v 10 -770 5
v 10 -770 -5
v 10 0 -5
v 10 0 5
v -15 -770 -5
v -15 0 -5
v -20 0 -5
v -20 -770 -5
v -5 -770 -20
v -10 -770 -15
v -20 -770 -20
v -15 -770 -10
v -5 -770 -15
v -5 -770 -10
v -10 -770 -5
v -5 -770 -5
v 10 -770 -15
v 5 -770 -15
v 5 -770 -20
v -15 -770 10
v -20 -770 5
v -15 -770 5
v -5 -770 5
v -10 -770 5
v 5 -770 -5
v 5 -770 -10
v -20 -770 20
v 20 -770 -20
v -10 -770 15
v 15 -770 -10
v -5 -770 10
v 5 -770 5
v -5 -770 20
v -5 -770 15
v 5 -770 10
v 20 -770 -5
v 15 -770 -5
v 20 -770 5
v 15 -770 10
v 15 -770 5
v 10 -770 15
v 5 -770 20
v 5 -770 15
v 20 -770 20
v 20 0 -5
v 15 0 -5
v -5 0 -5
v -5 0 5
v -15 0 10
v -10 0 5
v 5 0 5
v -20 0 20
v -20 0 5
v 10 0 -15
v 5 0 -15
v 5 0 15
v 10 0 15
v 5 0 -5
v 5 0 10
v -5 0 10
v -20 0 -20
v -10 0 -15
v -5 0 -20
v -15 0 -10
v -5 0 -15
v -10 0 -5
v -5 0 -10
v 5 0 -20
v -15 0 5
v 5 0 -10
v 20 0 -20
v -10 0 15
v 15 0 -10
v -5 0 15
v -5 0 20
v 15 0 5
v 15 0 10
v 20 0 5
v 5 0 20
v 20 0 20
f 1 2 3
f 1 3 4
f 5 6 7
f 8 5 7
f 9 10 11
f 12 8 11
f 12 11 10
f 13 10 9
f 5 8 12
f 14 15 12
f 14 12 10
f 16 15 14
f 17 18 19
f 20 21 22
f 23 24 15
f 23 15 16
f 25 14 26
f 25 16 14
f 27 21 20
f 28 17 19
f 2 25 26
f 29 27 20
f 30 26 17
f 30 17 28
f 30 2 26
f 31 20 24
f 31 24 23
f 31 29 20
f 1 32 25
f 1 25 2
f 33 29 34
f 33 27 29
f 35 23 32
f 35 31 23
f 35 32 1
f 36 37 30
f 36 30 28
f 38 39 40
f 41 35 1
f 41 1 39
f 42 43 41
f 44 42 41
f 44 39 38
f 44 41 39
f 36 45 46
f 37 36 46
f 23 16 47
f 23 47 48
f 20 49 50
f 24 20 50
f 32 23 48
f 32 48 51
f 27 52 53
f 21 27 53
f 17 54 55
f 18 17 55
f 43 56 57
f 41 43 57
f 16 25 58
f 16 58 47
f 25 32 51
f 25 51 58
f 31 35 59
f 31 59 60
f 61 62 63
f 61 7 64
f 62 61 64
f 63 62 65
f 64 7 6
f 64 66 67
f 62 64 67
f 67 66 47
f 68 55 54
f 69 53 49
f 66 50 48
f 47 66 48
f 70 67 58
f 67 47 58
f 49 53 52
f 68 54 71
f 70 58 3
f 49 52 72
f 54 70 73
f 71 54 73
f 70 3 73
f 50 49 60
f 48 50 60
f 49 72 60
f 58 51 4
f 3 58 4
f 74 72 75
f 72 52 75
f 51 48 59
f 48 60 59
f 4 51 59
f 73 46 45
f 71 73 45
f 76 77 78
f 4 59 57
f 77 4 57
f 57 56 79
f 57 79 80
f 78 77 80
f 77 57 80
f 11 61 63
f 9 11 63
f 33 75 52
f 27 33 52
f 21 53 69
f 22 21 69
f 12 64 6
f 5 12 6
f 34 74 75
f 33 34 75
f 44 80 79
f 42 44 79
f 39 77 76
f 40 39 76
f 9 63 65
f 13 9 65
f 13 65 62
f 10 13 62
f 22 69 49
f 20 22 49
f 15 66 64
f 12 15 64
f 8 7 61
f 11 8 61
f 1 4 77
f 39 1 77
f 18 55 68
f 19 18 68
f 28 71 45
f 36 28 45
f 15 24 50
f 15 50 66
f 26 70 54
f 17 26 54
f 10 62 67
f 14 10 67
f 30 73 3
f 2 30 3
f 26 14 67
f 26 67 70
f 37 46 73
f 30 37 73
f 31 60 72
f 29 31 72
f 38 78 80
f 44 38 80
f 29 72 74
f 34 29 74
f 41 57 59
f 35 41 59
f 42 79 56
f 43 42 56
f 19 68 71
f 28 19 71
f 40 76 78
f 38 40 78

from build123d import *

# Parameters (mm, degrees)
F1_DEPTH = 770


with BuildPart() as f1:
    # F0 (on Front) → F1 (new body)
    with BuildSketch(Plane.XZ):
        Polygon((20, 5), (20, 20), (5, 20), (5, 15), (10, 15), (5, 10), (-5, 10), (-10, 15), (-5, 15), (-5, 20), (-20, 20), (-20, 5), (-15, 5), (-15, 10), (-10, 5), (-10, -5), (-15, -10), (-15, -5), (-20, -5), (-20, -20), (-5, -20), (-5, -15), (-10, -15), (-5, -10), (5, -10), (10, -15), (5, -15), (5, -20), (20, -20), (20, -5), (15, -5), (15, -10), (10, -5), (10, 5), (15, 10), (15, 5), align=None)
        Polygon((-5, 0), (-5, 5), (0, 5), (5, 5), (5, 0), (5, -5), (0, -5), (-5, -5), align=None, mode=Mode.SUBTRACT)
    extrude(amount=F1_DEPTH)


solid = f1.part
